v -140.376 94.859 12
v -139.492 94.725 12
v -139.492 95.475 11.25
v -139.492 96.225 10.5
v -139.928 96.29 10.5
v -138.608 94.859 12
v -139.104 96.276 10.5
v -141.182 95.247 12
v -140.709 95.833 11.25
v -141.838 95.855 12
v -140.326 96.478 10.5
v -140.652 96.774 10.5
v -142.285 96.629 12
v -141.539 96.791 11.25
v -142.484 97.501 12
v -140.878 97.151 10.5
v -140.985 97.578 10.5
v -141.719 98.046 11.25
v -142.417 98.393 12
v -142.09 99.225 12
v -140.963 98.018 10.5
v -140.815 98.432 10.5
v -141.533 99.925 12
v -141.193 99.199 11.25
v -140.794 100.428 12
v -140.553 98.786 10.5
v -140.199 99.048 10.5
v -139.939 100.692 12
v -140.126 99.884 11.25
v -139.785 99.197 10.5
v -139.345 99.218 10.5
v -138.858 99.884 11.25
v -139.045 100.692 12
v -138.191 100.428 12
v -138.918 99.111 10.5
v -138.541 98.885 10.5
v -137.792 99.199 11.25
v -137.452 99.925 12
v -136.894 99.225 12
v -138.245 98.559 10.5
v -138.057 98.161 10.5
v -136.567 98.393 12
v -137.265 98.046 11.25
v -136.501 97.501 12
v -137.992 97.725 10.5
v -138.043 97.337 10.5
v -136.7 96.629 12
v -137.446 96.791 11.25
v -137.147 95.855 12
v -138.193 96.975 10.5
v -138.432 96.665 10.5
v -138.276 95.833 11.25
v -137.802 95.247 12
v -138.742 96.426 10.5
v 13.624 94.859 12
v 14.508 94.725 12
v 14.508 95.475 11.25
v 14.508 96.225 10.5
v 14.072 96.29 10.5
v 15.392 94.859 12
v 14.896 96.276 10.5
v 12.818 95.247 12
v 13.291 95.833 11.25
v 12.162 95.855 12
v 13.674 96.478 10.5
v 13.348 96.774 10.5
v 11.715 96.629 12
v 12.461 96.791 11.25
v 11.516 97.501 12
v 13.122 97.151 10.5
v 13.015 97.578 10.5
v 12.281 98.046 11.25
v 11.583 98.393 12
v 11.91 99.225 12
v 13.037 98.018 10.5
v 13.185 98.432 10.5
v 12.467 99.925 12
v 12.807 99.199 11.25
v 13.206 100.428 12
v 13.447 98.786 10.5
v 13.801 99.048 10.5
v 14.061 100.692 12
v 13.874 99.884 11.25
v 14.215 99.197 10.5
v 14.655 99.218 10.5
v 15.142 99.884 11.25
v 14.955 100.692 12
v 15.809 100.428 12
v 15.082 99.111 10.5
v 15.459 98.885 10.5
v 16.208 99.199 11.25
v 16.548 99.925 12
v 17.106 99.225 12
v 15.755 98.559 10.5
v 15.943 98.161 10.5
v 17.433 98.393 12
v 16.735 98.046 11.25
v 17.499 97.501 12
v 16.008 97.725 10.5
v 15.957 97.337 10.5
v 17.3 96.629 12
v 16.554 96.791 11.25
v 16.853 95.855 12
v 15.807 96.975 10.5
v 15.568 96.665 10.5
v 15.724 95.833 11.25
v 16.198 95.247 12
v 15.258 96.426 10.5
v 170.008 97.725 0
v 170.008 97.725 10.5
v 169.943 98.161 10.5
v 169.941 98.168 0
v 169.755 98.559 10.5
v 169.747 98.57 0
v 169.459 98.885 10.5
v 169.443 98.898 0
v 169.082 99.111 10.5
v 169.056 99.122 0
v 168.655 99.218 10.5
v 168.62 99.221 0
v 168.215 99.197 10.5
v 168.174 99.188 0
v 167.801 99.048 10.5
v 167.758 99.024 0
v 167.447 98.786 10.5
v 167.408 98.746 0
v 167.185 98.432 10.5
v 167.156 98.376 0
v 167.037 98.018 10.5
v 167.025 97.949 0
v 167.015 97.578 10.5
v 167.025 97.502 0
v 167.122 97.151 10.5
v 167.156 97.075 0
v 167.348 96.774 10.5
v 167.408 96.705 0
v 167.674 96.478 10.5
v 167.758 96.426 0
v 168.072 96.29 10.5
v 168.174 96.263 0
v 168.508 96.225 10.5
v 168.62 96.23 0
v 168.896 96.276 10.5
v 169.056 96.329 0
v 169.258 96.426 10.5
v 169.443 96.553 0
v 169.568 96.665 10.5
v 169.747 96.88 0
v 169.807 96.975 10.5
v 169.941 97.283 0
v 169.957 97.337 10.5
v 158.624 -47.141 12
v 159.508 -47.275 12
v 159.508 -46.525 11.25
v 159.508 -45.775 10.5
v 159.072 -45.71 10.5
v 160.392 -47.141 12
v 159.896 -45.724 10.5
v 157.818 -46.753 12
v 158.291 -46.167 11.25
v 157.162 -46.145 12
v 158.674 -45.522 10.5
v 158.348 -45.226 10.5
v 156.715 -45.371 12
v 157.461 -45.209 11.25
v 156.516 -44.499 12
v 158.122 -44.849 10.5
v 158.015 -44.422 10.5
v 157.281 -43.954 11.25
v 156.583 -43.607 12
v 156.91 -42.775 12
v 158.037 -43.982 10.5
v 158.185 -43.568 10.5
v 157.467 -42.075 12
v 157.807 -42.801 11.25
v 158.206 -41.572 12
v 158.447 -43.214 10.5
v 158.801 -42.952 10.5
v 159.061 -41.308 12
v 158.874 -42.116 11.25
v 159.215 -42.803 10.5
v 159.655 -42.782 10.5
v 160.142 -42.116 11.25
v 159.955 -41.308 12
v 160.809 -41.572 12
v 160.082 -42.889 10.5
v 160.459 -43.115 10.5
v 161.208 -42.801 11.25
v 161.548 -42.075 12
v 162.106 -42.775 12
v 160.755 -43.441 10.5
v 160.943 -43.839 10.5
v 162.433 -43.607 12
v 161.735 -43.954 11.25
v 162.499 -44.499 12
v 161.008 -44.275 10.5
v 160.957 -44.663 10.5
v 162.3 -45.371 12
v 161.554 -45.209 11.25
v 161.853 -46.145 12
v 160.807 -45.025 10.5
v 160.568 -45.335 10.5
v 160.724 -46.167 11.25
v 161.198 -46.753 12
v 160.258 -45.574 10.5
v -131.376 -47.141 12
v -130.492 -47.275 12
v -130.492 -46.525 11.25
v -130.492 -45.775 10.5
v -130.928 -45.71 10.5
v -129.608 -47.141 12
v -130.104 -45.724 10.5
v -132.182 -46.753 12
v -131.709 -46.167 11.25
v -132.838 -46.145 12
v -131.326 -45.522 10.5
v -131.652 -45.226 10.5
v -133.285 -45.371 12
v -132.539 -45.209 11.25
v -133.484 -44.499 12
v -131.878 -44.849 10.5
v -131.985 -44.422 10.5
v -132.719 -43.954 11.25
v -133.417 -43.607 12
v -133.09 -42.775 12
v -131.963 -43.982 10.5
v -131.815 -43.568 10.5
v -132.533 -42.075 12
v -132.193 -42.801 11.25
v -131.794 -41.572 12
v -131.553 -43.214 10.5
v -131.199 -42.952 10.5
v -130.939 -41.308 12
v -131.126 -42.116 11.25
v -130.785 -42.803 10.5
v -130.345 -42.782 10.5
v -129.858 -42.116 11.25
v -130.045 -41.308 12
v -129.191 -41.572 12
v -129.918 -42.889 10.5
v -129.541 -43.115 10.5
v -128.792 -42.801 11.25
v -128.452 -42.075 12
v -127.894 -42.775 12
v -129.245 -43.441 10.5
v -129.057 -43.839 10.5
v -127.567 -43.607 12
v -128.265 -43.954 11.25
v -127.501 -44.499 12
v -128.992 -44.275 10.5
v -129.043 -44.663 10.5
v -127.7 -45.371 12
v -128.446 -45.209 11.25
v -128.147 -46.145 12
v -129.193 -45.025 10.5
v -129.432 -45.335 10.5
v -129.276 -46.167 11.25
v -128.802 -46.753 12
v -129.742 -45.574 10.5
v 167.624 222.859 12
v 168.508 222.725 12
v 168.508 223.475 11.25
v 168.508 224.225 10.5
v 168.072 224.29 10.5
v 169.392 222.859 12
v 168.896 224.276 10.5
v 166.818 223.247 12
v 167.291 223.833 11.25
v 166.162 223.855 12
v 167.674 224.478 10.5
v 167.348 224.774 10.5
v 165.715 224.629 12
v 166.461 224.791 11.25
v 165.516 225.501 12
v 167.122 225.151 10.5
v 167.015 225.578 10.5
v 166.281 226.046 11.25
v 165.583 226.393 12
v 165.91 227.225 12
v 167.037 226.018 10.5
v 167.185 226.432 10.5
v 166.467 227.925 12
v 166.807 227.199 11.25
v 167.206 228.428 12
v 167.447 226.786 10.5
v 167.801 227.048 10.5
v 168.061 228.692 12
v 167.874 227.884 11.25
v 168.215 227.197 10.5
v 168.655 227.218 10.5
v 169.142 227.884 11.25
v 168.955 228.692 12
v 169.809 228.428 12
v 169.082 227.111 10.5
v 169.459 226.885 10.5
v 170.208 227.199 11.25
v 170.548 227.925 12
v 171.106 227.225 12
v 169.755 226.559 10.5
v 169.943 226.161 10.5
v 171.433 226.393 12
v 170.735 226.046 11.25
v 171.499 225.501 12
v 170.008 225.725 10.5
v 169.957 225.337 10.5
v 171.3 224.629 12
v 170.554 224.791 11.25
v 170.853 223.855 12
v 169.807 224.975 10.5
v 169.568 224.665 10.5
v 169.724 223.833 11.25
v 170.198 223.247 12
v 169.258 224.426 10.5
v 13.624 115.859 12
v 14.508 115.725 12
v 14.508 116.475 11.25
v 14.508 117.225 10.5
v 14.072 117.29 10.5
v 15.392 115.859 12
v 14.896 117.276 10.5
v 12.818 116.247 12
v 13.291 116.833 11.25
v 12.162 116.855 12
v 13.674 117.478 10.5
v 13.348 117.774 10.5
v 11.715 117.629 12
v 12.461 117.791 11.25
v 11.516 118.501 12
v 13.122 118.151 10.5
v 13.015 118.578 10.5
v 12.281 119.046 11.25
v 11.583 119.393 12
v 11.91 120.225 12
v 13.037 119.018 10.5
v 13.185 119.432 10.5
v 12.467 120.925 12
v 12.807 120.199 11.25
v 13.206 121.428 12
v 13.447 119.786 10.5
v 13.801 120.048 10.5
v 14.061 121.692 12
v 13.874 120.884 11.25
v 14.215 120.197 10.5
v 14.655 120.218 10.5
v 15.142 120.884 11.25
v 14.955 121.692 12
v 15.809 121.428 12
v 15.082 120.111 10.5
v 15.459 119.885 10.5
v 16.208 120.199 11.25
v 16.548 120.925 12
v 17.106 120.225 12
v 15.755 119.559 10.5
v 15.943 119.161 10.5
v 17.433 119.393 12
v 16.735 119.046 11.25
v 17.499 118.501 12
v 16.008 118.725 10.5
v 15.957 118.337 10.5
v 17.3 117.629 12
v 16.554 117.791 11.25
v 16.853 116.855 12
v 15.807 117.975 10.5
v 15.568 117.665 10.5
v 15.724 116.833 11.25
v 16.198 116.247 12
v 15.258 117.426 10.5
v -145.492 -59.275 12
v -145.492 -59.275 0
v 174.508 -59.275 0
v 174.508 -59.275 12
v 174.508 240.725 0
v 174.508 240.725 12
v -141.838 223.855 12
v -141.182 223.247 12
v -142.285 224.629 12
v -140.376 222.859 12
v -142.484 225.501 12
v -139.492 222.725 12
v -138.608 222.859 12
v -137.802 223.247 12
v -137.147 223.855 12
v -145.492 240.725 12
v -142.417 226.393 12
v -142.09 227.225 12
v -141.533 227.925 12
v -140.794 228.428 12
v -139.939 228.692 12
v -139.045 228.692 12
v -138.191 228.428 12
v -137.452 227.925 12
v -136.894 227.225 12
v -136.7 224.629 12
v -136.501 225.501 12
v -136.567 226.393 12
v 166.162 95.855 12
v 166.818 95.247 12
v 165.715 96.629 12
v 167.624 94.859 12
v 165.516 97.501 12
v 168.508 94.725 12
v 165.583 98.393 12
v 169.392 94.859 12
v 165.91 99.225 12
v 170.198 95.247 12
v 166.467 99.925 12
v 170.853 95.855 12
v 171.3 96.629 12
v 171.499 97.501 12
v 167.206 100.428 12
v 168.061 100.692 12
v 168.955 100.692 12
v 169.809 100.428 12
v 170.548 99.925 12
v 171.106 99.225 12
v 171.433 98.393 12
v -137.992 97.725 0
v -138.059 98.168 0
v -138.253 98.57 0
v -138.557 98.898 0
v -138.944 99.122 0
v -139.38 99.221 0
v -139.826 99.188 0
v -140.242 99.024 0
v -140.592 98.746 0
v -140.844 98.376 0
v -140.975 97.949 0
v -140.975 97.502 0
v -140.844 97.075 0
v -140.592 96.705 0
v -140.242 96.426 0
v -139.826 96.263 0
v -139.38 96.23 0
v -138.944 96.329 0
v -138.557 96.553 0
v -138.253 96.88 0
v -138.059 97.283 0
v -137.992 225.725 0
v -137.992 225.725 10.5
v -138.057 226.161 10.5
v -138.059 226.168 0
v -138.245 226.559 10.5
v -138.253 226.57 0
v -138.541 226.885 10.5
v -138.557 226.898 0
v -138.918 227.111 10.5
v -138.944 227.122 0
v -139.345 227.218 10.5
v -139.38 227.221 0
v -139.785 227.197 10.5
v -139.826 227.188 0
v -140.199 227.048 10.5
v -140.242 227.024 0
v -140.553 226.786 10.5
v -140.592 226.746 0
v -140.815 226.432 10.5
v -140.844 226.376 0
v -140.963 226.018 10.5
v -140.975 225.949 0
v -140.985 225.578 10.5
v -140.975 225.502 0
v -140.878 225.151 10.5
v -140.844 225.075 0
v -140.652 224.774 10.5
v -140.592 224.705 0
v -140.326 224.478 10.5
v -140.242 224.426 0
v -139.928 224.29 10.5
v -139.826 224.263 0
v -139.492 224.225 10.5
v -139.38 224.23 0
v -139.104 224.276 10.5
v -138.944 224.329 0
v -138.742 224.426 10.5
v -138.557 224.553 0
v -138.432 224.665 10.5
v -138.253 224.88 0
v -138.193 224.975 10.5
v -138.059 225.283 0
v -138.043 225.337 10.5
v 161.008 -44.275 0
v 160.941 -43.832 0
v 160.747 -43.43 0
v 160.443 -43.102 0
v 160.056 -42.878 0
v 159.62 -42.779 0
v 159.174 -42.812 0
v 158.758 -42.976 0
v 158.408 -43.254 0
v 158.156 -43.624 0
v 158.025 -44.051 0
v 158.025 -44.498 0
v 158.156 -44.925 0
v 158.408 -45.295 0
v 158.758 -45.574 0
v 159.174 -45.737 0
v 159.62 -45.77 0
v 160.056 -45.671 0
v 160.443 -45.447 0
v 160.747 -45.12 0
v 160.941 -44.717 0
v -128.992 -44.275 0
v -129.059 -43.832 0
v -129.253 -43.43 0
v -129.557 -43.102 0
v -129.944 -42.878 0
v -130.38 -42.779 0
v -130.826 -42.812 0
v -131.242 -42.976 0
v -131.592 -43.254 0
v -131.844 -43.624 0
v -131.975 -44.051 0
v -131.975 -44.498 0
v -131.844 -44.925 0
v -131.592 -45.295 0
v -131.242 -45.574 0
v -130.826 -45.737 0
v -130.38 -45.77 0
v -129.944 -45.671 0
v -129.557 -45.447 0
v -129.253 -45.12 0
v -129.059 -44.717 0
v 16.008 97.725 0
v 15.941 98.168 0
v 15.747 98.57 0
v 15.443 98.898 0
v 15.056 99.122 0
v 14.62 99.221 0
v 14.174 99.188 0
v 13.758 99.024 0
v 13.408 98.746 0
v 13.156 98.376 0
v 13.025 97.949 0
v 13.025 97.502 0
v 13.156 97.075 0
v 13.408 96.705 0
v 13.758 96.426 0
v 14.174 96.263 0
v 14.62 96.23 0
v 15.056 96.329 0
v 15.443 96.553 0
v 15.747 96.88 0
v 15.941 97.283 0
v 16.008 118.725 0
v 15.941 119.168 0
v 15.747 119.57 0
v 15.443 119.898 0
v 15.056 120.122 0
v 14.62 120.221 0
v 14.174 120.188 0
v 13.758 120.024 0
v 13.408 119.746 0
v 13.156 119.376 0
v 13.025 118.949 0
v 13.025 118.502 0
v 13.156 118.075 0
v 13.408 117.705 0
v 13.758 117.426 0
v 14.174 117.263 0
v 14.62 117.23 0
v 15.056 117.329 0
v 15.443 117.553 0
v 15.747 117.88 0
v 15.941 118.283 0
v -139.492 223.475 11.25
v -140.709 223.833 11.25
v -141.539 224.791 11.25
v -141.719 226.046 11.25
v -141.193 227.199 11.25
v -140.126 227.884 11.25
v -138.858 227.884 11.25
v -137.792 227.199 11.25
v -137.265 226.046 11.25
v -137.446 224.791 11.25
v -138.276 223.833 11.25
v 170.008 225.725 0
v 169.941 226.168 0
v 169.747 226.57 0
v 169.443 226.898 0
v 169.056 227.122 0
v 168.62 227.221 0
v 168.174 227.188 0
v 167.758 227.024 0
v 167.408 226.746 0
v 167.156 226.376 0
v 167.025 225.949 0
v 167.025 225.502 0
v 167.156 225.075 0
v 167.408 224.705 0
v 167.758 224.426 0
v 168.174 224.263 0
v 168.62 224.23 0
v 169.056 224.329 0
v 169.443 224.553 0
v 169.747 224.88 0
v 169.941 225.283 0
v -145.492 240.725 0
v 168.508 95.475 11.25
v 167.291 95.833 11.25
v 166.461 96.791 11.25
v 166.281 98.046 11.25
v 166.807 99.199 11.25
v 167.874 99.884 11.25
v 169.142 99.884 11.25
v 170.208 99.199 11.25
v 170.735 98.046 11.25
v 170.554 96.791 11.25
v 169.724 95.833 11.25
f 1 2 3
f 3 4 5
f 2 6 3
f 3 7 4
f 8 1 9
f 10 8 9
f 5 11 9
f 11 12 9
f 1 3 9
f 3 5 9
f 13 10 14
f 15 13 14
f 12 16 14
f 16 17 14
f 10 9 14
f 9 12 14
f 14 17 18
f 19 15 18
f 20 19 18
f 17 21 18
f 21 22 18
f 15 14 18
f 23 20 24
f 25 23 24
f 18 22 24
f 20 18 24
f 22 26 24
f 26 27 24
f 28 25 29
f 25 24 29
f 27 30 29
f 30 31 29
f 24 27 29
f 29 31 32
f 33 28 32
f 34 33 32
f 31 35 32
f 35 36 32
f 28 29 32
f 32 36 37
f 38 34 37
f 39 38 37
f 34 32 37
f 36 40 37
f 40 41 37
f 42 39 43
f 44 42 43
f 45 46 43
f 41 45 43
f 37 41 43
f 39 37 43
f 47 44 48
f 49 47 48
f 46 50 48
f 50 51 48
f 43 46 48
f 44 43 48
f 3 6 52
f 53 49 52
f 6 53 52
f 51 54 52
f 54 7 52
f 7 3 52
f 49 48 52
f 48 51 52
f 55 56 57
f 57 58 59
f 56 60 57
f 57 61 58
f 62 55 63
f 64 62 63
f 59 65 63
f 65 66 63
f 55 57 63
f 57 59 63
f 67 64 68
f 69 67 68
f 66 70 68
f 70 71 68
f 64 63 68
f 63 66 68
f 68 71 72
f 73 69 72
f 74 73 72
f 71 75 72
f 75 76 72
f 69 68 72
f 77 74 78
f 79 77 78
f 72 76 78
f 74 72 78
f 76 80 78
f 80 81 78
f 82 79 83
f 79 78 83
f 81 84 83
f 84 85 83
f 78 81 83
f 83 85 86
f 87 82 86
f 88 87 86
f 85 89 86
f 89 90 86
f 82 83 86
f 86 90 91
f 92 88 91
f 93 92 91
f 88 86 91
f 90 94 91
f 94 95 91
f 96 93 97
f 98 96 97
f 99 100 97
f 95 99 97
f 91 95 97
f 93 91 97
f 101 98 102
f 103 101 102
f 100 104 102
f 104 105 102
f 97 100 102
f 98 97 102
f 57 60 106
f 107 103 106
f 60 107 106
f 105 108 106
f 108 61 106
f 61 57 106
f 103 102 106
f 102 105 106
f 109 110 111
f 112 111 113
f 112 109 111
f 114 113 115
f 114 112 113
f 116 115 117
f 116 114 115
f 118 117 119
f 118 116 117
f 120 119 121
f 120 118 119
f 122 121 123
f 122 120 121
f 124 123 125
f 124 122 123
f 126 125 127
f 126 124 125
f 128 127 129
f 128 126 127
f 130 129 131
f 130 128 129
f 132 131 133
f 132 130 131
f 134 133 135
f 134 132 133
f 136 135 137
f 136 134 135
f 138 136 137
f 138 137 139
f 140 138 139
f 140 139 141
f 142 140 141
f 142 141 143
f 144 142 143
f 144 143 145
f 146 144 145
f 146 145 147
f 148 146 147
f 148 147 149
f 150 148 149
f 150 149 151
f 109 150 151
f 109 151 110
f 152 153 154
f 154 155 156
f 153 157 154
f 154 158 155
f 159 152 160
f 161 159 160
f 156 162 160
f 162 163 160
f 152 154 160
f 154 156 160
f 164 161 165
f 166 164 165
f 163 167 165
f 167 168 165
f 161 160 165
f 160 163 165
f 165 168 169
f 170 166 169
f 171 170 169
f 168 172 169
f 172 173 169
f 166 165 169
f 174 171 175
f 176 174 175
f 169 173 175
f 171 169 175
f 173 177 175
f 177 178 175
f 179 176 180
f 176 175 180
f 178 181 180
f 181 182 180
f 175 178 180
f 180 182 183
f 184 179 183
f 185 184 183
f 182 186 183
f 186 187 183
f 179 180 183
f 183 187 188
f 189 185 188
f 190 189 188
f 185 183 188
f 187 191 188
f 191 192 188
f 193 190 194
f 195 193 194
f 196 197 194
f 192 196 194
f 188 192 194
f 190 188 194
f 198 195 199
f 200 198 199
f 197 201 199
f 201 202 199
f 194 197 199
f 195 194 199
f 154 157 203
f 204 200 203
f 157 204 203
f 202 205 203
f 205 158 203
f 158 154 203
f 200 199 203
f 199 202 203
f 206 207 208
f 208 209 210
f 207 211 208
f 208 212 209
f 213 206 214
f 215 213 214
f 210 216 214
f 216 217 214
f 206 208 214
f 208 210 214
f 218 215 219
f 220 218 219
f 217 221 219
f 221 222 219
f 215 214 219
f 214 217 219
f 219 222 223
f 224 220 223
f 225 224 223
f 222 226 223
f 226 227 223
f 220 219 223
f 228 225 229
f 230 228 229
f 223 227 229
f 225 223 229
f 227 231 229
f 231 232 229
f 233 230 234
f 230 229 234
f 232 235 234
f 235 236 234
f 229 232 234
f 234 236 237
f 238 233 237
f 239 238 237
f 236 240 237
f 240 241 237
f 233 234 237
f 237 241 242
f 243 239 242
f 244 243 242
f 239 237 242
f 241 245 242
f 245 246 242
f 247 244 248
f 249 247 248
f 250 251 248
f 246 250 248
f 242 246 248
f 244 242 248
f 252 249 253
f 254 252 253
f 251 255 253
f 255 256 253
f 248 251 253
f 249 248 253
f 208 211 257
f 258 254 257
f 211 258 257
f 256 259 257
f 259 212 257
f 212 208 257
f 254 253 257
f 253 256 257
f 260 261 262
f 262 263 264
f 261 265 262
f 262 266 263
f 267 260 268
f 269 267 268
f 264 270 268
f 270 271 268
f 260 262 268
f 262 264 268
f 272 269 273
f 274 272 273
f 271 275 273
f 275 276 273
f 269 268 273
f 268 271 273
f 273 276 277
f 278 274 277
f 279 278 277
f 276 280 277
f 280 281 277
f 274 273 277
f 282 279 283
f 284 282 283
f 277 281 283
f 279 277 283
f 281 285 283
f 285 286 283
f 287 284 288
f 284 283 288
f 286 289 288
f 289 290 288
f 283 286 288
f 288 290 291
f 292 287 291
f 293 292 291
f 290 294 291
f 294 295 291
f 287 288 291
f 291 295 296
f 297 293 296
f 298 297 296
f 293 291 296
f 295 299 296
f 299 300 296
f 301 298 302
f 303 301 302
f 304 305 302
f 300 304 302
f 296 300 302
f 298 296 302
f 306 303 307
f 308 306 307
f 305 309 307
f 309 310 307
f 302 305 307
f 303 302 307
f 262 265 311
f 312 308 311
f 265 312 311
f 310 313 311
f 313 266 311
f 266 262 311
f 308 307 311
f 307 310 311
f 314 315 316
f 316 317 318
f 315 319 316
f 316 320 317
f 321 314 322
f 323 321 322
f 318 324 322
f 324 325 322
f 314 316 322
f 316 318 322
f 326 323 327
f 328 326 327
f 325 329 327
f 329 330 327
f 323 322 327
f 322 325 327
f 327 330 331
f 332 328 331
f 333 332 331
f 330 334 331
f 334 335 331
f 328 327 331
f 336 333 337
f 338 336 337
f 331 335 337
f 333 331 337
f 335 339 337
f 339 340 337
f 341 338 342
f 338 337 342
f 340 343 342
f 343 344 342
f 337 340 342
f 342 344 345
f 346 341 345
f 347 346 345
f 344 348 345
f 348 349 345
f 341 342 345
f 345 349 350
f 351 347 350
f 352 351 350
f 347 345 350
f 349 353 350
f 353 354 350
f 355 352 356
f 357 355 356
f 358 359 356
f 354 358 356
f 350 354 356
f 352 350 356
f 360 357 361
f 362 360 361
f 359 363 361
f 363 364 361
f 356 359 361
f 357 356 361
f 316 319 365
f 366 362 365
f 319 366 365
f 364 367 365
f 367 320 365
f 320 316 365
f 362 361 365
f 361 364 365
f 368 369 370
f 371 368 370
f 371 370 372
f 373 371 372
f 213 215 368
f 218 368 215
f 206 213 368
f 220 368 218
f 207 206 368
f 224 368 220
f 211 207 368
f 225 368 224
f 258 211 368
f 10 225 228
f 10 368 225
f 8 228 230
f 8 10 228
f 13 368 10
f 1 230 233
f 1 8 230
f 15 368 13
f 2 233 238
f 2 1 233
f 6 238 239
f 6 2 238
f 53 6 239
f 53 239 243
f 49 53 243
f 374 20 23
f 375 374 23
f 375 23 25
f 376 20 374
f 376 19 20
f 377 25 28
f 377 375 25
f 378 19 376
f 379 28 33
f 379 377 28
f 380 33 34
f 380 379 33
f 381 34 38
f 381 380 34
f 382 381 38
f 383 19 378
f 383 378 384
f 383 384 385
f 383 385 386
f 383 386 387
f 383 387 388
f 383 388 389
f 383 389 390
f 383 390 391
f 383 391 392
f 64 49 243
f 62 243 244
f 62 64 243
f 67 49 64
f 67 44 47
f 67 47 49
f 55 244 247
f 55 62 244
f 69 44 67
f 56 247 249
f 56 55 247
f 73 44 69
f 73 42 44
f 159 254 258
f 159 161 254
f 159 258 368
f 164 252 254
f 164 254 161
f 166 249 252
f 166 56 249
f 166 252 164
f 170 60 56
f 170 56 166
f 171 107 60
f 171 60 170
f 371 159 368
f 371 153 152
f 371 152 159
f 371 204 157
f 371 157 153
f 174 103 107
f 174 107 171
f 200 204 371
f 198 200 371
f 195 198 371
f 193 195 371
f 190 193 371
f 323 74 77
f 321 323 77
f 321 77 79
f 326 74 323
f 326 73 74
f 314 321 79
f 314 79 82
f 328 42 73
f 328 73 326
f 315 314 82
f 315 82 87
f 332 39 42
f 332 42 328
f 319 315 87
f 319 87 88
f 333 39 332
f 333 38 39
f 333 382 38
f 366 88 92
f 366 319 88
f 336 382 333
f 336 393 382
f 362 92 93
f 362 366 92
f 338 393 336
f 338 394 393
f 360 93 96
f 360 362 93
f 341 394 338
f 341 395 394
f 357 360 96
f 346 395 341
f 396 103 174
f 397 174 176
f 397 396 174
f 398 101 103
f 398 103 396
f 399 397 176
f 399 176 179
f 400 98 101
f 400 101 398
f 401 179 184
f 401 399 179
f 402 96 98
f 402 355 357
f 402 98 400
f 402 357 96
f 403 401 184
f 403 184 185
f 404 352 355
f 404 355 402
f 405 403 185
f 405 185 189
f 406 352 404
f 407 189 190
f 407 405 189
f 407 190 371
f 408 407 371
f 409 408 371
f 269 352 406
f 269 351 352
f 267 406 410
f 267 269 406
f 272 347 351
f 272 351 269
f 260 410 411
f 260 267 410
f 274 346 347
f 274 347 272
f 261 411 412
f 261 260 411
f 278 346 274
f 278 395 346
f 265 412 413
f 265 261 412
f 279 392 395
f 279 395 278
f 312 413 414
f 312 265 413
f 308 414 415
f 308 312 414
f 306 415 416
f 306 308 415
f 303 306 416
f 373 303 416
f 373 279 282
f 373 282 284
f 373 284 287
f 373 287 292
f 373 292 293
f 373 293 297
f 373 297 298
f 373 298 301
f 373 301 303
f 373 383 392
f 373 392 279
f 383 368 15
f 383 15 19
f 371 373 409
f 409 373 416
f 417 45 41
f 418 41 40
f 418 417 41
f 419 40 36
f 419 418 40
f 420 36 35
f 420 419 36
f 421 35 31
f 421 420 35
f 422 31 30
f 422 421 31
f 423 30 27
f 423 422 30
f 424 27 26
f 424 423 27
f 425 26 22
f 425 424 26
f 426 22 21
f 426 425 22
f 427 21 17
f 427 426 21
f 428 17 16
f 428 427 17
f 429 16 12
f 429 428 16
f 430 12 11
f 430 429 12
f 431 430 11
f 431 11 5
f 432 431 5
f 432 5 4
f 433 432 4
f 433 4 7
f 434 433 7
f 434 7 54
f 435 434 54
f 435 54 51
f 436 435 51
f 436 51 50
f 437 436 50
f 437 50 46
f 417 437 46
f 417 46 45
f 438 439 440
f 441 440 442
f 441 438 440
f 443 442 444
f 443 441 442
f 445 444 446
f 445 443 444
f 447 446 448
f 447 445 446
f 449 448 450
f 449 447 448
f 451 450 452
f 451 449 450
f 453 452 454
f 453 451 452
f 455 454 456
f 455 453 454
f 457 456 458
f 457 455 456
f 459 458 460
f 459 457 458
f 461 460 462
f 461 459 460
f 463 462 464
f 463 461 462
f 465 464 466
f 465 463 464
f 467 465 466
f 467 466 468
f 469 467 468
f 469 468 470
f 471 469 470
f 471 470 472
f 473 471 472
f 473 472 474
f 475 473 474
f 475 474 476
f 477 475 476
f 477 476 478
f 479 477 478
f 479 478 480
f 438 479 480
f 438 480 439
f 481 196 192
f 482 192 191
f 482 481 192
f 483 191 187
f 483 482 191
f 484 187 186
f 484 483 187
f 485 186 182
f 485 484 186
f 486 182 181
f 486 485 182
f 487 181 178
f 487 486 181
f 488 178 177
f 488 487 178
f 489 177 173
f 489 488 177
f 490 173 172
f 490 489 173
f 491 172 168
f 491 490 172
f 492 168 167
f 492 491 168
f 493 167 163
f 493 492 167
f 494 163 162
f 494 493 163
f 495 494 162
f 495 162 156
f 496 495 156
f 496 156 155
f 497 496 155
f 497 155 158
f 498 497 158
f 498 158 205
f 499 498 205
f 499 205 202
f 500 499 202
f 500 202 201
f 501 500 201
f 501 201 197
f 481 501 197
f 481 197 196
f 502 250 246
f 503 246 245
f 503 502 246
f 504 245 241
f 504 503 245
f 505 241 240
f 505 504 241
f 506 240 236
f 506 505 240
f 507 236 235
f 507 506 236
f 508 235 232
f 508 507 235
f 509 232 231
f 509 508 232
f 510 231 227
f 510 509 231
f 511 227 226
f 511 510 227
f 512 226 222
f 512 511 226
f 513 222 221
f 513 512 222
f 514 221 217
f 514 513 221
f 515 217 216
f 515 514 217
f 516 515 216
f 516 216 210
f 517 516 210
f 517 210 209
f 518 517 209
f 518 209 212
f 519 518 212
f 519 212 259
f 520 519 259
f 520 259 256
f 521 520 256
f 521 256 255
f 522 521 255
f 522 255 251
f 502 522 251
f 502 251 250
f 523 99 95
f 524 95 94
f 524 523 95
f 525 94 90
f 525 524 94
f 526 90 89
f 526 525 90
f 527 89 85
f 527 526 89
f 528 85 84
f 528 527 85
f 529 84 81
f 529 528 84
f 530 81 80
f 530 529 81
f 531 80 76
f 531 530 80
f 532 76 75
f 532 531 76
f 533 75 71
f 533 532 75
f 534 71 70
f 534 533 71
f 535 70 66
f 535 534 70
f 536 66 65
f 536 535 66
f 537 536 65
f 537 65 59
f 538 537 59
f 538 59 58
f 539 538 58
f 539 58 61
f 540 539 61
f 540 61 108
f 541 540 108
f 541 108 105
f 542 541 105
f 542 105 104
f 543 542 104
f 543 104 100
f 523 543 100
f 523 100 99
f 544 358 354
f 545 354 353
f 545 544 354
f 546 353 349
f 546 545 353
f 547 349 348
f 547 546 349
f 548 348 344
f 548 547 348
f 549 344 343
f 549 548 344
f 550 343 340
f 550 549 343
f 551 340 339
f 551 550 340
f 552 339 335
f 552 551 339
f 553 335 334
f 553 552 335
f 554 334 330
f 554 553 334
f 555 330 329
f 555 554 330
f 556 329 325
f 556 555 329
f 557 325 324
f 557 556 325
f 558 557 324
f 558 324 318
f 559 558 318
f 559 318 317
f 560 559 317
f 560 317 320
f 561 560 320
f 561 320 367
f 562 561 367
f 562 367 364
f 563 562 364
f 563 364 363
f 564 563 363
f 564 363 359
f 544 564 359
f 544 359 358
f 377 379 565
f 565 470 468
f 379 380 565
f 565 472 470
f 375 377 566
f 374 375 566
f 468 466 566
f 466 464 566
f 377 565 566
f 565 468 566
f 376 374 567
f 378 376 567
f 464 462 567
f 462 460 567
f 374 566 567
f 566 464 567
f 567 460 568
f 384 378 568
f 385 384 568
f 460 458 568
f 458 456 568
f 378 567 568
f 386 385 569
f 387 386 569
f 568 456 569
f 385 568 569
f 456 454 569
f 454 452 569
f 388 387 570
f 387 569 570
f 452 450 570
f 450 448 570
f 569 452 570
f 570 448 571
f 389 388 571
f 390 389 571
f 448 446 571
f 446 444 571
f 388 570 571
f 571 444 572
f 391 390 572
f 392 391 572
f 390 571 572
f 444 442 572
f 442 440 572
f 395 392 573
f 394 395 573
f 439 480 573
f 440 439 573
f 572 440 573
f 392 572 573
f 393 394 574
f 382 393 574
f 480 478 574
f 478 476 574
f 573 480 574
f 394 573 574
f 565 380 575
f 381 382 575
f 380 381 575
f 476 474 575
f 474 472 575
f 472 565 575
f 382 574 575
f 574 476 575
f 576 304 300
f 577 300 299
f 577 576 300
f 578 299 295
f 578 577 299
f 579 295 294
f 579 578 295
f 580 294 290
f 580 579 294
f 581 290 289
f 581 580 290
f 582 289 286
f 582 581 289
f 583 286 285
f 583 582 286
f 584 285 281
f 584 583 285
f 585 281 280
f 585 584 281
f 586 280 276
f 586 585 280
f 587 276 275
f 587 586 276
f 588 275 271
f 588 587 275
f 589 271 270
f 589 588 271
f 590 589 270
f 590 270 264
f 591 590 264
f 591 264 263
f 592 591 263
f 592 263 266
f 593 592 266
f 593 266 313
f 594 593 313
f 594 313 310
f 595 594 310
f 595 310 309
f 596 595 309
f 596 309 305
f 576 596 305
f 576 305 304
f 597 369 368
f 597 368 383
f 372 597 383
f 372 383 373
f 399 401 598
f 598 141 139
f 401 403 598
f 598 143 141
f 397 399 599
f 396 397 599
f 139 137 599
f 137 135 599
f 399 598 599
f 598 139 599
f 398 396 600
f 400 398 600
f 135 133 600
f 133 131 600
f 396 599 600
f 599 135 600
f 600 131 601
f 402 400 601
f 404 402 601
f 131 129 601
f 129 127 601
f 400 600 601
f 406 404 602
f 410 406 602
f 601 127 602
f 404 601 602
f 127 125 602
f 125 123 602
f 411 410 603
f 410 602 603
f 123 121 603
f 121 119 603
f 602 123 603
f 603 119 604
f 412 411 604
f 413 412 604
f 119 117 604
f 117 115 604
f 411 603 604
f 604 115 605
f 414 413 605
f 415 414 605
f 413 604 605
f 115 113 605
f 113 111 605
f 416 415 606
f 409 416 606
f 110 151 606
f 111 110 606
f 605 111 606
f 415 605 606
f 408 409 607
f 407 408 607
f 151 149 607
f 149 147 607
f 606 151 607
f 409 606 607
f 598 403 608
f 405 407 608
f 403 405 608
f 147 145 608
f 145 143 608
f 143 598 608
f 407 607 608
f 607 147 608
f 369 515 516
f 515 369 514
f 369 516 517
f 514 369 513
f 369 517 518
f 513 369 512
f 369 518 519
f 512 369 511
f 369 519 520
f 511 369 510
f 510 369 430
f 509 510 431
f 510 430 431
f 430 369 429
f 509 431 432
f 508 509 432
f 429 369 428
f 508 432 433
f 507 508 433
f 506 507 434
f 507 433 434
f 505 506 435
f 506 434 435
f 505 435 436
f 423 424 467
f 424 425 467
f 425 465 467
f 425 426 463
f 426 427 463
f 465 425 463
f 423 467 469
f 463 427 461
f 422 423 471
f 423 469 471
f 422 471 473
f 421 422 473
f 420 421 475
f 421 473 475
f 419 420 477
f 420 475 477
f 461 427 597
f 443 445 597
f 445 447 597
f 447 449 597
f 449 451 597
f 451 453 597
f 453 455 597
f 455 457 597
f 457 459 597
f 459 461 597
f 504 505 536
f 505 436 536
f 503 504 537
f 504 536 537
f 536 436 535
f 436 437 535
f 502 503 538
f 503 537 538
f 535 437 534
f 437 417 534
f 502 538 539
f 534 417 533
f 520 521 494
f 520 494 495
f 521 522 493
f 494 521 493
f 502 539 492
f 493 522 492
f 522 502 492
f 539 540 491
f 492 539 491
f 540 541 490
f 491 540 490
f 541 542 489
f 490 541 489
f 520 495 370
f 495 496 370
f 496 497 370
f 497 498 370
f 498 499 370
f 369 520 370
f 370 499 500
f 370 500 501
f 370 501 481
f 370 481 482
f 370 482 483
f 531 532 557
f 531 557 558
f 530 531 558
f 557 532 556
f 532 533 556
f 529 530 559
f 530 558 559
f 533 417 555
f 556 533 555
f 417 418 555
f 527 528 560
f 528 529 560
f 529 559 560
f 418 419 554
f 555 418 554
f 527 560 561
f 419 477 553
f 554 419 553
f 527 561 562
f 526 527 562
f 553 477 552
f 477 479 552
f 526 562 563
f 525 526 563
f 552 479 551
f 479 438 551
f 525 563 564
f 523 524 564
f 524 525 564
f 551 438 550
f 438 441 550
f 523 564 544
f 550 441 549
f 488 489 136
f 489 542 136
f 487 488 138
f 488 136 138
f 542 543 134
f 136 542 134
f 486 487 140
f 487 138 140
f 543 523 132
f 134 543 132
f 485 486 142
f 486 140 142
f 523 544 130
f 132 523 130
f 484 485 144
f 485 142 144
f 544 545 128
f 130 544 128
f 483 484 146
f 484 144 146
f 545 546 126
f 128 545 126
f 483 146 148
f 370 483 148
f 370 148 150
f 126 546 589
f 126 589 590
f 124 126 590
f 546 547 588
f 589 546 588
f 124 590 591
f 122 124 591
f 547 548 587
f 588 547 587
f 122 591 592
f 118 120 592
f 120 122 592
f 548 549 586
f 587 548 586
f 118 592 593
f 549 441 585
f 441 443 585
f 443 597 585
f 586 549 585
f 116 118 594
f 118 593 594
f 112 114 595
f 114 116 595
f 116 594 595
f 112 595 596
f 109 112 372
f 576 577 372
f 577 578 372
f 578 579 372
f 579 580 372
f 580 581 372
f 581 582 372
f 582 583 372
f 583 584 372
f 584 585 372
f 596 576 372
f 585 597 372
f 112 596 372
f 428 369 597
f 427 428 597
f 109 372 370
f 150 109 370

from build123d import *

# Parameters (mm, degrees)
SKETCH1_W           = 320
SKETCH1_H           = 300
SKETCH1_R           = 1.5
BOSS_EXTRUDE1_DEPTH = 12


with BuildPart() as part:
    # Sketch1 → Boss-Extrude1 (new body)
    with BuildSketch(Plane.XY):
        with Locations((14.507772021, 90.725388601)):
            Rectangle(SKETCH1_W, SKETCH1_H)
        with Locations((-139.492227979, 225.725388601)):
            Circle(SKETCH1_R, mode=Mode.SUBTRACT)
        with Locations((-139.492227979, 97.725388601)):
            Circle(SKETCH1_R, mode=Mode.SUBTRACT)
        with Locations((168.507772021, 225.725388601)):
            Circle(SKETCH1_R, mode=Mode.SUBTRACT)
        with Locations((168.507772021, 97.725388601)):
            Circle(SKETCH1_R, mode=Mode.SUBTRACT)
        with Locations((-130.492227979, -44.274611399)):
            Circle(SKETCH1_R, mode=Mode.SUBTRACT)
        with Locations((159.507772021, -44.274611399)):
            Circle(SKETCH1_R, mode=Mode.SUBTRACT)
        with Locations((14.507772021, 97.725388601)):
            Circle(SKETCH1_R, mode=Mode.SUBTRACT)
        with Locations((14.507772021, 118.725388601)):
            Circle(SKETCH1_R, mode=Mode.SUBTRACT)
    extrude(amount=BOSS_EXTRUDE1_DEPTH)

    # Cut-Extrude1 cone 1 section (through the dimple's axis) → Cut-Extrude1 (revolve, cut)
    with BuildSketch(Plane(origin=(-139.492227979, 225.725388601, 12), x_dir=(0, -1, 0), z_dir=(1, 0, 0))):
        Polygon((0, 0), (3, 0), (0, 3), align=None)
    revolve(axis=Axis((-139.492227979, 225.725388601, 12), (0, 0, -1)), mode=Mode.SUBTRACT)

    # Cut-Extrude1 cone 2 section (through the dimple's axis) → Cut-Extrude1 cone 2 (revolve, cut)
    with BuildSketch(Plane(origin=(-139.492227979, 97.725388601, 12), x_dir=(0, -1, 0), z_dir=(1, 0, 0))):
        Polygon((0, 0), (3, 0), (0, 3), align=None)
    revolve(axis=Axis((-139.492227979, 97.725388601, 12), (0, 0, -1)), mode=Mode.SUBTRACT)

    # Cut-Extrude1 cone 3 section (through the dimple's axis) → Cut-Extrude1 cone 3 (revolve, cut)
    with BuildSketch(Plane(origin=(168.507772021, 225.725388601, 12), x_dir=(0, -1, 0), z_dir=(1, 0, 0))):
        Polygon((0, 0), (3, 0), (0, 3), align=None)
    revolve(axis=Axis((168.507772021, 225.725388601, 12), (0, 0, -1)), mode=Mode.SUBTRACT)

    # Cut-Extrude1 cone 4 section (through the dimple's axis) → Cut-Extrude1 cone 4 (revolve, cut)
    with BuildSketch(Plane(origin=(168.507772021, 97.725388601, 12), x_dir=(0, -1, 0), z_dir=(1, 0, 0))):
        Polygon((0, 0), (3, 0), (0, 3), align=None)
    revolve(axis=Axis((168.507772021, 97.725388601, 12), (0, 0, -1)), mode=Mode.SUBTRACT)

    # Cut-Extrude1 cone 5 section (through the dimple's axis) → Cut-Extrude1 cone 5 (revolve, cut)
    with BuildSketch(Plane(origin=(14.507772021, 97.725388601, 12), x_dir=(0, -1, 0), z_dir=(1, 0, 0))):
        Polygon((0, 0), (3, 0), (0, 3), align=None)
    revolve(axis=Axis((14.507772021, 97.725388601, 12), (0, 0, -1)), mode=Mode.SUBTRACT)

    # Cut-Extrude1 cone 6 section (through the dimple's axis) → Cut-Extrude1 cone 6 (revolve, cut)
    with BuildSketch(Plane(origin=(159.507772021, -44.274611399, 12), x_dir=(0, -1, 0), z_dir=(1, 0, 0))):
        Polygon((0, 0), (3, 0), (0, 3), align=None)
    revolve(axis=Axis((159.507772021, -44.274611399, 12), (0, 0, -1)), mode=Mode.SUBTRACT)

    # Cut-Extrude1 cone 7 section (through the dimple's axis) → Cut-Extrude1 cone 7 (revolve, cut)
    with BuildSketch(Plane(origin=(-130.492227979, -44.274611399, 12), x_dir=(0, -1, 0), z_dir=(1, 0, 0))):
        Polygon((0, 0), (3, 0), (0, 3), align=None)
    revolve(axis=Axis((-130.492227979, -44.274611399, 12), (0, 0, -1)), mode=Mode.SUBTRACT)

    # Cut-Extrude1 cone 8 section (through the dimple's axis) → Cut-Extrude1 cone 8 (revolve, cut)
    with BuildSketch(Plane(origin=(14.507772021, 118.725388601, 12), x_dir=(0, -1, 0), z_dir=(1, 0, 0))):
        Polygon((0, 0), (3, 0), (0, 3), align=None)
    revolve(axis=Axis((14.507772021, 118.725388601, 12), (0, 0, -1)), mode=Mode.SUBTRACT)


solid = part.part
